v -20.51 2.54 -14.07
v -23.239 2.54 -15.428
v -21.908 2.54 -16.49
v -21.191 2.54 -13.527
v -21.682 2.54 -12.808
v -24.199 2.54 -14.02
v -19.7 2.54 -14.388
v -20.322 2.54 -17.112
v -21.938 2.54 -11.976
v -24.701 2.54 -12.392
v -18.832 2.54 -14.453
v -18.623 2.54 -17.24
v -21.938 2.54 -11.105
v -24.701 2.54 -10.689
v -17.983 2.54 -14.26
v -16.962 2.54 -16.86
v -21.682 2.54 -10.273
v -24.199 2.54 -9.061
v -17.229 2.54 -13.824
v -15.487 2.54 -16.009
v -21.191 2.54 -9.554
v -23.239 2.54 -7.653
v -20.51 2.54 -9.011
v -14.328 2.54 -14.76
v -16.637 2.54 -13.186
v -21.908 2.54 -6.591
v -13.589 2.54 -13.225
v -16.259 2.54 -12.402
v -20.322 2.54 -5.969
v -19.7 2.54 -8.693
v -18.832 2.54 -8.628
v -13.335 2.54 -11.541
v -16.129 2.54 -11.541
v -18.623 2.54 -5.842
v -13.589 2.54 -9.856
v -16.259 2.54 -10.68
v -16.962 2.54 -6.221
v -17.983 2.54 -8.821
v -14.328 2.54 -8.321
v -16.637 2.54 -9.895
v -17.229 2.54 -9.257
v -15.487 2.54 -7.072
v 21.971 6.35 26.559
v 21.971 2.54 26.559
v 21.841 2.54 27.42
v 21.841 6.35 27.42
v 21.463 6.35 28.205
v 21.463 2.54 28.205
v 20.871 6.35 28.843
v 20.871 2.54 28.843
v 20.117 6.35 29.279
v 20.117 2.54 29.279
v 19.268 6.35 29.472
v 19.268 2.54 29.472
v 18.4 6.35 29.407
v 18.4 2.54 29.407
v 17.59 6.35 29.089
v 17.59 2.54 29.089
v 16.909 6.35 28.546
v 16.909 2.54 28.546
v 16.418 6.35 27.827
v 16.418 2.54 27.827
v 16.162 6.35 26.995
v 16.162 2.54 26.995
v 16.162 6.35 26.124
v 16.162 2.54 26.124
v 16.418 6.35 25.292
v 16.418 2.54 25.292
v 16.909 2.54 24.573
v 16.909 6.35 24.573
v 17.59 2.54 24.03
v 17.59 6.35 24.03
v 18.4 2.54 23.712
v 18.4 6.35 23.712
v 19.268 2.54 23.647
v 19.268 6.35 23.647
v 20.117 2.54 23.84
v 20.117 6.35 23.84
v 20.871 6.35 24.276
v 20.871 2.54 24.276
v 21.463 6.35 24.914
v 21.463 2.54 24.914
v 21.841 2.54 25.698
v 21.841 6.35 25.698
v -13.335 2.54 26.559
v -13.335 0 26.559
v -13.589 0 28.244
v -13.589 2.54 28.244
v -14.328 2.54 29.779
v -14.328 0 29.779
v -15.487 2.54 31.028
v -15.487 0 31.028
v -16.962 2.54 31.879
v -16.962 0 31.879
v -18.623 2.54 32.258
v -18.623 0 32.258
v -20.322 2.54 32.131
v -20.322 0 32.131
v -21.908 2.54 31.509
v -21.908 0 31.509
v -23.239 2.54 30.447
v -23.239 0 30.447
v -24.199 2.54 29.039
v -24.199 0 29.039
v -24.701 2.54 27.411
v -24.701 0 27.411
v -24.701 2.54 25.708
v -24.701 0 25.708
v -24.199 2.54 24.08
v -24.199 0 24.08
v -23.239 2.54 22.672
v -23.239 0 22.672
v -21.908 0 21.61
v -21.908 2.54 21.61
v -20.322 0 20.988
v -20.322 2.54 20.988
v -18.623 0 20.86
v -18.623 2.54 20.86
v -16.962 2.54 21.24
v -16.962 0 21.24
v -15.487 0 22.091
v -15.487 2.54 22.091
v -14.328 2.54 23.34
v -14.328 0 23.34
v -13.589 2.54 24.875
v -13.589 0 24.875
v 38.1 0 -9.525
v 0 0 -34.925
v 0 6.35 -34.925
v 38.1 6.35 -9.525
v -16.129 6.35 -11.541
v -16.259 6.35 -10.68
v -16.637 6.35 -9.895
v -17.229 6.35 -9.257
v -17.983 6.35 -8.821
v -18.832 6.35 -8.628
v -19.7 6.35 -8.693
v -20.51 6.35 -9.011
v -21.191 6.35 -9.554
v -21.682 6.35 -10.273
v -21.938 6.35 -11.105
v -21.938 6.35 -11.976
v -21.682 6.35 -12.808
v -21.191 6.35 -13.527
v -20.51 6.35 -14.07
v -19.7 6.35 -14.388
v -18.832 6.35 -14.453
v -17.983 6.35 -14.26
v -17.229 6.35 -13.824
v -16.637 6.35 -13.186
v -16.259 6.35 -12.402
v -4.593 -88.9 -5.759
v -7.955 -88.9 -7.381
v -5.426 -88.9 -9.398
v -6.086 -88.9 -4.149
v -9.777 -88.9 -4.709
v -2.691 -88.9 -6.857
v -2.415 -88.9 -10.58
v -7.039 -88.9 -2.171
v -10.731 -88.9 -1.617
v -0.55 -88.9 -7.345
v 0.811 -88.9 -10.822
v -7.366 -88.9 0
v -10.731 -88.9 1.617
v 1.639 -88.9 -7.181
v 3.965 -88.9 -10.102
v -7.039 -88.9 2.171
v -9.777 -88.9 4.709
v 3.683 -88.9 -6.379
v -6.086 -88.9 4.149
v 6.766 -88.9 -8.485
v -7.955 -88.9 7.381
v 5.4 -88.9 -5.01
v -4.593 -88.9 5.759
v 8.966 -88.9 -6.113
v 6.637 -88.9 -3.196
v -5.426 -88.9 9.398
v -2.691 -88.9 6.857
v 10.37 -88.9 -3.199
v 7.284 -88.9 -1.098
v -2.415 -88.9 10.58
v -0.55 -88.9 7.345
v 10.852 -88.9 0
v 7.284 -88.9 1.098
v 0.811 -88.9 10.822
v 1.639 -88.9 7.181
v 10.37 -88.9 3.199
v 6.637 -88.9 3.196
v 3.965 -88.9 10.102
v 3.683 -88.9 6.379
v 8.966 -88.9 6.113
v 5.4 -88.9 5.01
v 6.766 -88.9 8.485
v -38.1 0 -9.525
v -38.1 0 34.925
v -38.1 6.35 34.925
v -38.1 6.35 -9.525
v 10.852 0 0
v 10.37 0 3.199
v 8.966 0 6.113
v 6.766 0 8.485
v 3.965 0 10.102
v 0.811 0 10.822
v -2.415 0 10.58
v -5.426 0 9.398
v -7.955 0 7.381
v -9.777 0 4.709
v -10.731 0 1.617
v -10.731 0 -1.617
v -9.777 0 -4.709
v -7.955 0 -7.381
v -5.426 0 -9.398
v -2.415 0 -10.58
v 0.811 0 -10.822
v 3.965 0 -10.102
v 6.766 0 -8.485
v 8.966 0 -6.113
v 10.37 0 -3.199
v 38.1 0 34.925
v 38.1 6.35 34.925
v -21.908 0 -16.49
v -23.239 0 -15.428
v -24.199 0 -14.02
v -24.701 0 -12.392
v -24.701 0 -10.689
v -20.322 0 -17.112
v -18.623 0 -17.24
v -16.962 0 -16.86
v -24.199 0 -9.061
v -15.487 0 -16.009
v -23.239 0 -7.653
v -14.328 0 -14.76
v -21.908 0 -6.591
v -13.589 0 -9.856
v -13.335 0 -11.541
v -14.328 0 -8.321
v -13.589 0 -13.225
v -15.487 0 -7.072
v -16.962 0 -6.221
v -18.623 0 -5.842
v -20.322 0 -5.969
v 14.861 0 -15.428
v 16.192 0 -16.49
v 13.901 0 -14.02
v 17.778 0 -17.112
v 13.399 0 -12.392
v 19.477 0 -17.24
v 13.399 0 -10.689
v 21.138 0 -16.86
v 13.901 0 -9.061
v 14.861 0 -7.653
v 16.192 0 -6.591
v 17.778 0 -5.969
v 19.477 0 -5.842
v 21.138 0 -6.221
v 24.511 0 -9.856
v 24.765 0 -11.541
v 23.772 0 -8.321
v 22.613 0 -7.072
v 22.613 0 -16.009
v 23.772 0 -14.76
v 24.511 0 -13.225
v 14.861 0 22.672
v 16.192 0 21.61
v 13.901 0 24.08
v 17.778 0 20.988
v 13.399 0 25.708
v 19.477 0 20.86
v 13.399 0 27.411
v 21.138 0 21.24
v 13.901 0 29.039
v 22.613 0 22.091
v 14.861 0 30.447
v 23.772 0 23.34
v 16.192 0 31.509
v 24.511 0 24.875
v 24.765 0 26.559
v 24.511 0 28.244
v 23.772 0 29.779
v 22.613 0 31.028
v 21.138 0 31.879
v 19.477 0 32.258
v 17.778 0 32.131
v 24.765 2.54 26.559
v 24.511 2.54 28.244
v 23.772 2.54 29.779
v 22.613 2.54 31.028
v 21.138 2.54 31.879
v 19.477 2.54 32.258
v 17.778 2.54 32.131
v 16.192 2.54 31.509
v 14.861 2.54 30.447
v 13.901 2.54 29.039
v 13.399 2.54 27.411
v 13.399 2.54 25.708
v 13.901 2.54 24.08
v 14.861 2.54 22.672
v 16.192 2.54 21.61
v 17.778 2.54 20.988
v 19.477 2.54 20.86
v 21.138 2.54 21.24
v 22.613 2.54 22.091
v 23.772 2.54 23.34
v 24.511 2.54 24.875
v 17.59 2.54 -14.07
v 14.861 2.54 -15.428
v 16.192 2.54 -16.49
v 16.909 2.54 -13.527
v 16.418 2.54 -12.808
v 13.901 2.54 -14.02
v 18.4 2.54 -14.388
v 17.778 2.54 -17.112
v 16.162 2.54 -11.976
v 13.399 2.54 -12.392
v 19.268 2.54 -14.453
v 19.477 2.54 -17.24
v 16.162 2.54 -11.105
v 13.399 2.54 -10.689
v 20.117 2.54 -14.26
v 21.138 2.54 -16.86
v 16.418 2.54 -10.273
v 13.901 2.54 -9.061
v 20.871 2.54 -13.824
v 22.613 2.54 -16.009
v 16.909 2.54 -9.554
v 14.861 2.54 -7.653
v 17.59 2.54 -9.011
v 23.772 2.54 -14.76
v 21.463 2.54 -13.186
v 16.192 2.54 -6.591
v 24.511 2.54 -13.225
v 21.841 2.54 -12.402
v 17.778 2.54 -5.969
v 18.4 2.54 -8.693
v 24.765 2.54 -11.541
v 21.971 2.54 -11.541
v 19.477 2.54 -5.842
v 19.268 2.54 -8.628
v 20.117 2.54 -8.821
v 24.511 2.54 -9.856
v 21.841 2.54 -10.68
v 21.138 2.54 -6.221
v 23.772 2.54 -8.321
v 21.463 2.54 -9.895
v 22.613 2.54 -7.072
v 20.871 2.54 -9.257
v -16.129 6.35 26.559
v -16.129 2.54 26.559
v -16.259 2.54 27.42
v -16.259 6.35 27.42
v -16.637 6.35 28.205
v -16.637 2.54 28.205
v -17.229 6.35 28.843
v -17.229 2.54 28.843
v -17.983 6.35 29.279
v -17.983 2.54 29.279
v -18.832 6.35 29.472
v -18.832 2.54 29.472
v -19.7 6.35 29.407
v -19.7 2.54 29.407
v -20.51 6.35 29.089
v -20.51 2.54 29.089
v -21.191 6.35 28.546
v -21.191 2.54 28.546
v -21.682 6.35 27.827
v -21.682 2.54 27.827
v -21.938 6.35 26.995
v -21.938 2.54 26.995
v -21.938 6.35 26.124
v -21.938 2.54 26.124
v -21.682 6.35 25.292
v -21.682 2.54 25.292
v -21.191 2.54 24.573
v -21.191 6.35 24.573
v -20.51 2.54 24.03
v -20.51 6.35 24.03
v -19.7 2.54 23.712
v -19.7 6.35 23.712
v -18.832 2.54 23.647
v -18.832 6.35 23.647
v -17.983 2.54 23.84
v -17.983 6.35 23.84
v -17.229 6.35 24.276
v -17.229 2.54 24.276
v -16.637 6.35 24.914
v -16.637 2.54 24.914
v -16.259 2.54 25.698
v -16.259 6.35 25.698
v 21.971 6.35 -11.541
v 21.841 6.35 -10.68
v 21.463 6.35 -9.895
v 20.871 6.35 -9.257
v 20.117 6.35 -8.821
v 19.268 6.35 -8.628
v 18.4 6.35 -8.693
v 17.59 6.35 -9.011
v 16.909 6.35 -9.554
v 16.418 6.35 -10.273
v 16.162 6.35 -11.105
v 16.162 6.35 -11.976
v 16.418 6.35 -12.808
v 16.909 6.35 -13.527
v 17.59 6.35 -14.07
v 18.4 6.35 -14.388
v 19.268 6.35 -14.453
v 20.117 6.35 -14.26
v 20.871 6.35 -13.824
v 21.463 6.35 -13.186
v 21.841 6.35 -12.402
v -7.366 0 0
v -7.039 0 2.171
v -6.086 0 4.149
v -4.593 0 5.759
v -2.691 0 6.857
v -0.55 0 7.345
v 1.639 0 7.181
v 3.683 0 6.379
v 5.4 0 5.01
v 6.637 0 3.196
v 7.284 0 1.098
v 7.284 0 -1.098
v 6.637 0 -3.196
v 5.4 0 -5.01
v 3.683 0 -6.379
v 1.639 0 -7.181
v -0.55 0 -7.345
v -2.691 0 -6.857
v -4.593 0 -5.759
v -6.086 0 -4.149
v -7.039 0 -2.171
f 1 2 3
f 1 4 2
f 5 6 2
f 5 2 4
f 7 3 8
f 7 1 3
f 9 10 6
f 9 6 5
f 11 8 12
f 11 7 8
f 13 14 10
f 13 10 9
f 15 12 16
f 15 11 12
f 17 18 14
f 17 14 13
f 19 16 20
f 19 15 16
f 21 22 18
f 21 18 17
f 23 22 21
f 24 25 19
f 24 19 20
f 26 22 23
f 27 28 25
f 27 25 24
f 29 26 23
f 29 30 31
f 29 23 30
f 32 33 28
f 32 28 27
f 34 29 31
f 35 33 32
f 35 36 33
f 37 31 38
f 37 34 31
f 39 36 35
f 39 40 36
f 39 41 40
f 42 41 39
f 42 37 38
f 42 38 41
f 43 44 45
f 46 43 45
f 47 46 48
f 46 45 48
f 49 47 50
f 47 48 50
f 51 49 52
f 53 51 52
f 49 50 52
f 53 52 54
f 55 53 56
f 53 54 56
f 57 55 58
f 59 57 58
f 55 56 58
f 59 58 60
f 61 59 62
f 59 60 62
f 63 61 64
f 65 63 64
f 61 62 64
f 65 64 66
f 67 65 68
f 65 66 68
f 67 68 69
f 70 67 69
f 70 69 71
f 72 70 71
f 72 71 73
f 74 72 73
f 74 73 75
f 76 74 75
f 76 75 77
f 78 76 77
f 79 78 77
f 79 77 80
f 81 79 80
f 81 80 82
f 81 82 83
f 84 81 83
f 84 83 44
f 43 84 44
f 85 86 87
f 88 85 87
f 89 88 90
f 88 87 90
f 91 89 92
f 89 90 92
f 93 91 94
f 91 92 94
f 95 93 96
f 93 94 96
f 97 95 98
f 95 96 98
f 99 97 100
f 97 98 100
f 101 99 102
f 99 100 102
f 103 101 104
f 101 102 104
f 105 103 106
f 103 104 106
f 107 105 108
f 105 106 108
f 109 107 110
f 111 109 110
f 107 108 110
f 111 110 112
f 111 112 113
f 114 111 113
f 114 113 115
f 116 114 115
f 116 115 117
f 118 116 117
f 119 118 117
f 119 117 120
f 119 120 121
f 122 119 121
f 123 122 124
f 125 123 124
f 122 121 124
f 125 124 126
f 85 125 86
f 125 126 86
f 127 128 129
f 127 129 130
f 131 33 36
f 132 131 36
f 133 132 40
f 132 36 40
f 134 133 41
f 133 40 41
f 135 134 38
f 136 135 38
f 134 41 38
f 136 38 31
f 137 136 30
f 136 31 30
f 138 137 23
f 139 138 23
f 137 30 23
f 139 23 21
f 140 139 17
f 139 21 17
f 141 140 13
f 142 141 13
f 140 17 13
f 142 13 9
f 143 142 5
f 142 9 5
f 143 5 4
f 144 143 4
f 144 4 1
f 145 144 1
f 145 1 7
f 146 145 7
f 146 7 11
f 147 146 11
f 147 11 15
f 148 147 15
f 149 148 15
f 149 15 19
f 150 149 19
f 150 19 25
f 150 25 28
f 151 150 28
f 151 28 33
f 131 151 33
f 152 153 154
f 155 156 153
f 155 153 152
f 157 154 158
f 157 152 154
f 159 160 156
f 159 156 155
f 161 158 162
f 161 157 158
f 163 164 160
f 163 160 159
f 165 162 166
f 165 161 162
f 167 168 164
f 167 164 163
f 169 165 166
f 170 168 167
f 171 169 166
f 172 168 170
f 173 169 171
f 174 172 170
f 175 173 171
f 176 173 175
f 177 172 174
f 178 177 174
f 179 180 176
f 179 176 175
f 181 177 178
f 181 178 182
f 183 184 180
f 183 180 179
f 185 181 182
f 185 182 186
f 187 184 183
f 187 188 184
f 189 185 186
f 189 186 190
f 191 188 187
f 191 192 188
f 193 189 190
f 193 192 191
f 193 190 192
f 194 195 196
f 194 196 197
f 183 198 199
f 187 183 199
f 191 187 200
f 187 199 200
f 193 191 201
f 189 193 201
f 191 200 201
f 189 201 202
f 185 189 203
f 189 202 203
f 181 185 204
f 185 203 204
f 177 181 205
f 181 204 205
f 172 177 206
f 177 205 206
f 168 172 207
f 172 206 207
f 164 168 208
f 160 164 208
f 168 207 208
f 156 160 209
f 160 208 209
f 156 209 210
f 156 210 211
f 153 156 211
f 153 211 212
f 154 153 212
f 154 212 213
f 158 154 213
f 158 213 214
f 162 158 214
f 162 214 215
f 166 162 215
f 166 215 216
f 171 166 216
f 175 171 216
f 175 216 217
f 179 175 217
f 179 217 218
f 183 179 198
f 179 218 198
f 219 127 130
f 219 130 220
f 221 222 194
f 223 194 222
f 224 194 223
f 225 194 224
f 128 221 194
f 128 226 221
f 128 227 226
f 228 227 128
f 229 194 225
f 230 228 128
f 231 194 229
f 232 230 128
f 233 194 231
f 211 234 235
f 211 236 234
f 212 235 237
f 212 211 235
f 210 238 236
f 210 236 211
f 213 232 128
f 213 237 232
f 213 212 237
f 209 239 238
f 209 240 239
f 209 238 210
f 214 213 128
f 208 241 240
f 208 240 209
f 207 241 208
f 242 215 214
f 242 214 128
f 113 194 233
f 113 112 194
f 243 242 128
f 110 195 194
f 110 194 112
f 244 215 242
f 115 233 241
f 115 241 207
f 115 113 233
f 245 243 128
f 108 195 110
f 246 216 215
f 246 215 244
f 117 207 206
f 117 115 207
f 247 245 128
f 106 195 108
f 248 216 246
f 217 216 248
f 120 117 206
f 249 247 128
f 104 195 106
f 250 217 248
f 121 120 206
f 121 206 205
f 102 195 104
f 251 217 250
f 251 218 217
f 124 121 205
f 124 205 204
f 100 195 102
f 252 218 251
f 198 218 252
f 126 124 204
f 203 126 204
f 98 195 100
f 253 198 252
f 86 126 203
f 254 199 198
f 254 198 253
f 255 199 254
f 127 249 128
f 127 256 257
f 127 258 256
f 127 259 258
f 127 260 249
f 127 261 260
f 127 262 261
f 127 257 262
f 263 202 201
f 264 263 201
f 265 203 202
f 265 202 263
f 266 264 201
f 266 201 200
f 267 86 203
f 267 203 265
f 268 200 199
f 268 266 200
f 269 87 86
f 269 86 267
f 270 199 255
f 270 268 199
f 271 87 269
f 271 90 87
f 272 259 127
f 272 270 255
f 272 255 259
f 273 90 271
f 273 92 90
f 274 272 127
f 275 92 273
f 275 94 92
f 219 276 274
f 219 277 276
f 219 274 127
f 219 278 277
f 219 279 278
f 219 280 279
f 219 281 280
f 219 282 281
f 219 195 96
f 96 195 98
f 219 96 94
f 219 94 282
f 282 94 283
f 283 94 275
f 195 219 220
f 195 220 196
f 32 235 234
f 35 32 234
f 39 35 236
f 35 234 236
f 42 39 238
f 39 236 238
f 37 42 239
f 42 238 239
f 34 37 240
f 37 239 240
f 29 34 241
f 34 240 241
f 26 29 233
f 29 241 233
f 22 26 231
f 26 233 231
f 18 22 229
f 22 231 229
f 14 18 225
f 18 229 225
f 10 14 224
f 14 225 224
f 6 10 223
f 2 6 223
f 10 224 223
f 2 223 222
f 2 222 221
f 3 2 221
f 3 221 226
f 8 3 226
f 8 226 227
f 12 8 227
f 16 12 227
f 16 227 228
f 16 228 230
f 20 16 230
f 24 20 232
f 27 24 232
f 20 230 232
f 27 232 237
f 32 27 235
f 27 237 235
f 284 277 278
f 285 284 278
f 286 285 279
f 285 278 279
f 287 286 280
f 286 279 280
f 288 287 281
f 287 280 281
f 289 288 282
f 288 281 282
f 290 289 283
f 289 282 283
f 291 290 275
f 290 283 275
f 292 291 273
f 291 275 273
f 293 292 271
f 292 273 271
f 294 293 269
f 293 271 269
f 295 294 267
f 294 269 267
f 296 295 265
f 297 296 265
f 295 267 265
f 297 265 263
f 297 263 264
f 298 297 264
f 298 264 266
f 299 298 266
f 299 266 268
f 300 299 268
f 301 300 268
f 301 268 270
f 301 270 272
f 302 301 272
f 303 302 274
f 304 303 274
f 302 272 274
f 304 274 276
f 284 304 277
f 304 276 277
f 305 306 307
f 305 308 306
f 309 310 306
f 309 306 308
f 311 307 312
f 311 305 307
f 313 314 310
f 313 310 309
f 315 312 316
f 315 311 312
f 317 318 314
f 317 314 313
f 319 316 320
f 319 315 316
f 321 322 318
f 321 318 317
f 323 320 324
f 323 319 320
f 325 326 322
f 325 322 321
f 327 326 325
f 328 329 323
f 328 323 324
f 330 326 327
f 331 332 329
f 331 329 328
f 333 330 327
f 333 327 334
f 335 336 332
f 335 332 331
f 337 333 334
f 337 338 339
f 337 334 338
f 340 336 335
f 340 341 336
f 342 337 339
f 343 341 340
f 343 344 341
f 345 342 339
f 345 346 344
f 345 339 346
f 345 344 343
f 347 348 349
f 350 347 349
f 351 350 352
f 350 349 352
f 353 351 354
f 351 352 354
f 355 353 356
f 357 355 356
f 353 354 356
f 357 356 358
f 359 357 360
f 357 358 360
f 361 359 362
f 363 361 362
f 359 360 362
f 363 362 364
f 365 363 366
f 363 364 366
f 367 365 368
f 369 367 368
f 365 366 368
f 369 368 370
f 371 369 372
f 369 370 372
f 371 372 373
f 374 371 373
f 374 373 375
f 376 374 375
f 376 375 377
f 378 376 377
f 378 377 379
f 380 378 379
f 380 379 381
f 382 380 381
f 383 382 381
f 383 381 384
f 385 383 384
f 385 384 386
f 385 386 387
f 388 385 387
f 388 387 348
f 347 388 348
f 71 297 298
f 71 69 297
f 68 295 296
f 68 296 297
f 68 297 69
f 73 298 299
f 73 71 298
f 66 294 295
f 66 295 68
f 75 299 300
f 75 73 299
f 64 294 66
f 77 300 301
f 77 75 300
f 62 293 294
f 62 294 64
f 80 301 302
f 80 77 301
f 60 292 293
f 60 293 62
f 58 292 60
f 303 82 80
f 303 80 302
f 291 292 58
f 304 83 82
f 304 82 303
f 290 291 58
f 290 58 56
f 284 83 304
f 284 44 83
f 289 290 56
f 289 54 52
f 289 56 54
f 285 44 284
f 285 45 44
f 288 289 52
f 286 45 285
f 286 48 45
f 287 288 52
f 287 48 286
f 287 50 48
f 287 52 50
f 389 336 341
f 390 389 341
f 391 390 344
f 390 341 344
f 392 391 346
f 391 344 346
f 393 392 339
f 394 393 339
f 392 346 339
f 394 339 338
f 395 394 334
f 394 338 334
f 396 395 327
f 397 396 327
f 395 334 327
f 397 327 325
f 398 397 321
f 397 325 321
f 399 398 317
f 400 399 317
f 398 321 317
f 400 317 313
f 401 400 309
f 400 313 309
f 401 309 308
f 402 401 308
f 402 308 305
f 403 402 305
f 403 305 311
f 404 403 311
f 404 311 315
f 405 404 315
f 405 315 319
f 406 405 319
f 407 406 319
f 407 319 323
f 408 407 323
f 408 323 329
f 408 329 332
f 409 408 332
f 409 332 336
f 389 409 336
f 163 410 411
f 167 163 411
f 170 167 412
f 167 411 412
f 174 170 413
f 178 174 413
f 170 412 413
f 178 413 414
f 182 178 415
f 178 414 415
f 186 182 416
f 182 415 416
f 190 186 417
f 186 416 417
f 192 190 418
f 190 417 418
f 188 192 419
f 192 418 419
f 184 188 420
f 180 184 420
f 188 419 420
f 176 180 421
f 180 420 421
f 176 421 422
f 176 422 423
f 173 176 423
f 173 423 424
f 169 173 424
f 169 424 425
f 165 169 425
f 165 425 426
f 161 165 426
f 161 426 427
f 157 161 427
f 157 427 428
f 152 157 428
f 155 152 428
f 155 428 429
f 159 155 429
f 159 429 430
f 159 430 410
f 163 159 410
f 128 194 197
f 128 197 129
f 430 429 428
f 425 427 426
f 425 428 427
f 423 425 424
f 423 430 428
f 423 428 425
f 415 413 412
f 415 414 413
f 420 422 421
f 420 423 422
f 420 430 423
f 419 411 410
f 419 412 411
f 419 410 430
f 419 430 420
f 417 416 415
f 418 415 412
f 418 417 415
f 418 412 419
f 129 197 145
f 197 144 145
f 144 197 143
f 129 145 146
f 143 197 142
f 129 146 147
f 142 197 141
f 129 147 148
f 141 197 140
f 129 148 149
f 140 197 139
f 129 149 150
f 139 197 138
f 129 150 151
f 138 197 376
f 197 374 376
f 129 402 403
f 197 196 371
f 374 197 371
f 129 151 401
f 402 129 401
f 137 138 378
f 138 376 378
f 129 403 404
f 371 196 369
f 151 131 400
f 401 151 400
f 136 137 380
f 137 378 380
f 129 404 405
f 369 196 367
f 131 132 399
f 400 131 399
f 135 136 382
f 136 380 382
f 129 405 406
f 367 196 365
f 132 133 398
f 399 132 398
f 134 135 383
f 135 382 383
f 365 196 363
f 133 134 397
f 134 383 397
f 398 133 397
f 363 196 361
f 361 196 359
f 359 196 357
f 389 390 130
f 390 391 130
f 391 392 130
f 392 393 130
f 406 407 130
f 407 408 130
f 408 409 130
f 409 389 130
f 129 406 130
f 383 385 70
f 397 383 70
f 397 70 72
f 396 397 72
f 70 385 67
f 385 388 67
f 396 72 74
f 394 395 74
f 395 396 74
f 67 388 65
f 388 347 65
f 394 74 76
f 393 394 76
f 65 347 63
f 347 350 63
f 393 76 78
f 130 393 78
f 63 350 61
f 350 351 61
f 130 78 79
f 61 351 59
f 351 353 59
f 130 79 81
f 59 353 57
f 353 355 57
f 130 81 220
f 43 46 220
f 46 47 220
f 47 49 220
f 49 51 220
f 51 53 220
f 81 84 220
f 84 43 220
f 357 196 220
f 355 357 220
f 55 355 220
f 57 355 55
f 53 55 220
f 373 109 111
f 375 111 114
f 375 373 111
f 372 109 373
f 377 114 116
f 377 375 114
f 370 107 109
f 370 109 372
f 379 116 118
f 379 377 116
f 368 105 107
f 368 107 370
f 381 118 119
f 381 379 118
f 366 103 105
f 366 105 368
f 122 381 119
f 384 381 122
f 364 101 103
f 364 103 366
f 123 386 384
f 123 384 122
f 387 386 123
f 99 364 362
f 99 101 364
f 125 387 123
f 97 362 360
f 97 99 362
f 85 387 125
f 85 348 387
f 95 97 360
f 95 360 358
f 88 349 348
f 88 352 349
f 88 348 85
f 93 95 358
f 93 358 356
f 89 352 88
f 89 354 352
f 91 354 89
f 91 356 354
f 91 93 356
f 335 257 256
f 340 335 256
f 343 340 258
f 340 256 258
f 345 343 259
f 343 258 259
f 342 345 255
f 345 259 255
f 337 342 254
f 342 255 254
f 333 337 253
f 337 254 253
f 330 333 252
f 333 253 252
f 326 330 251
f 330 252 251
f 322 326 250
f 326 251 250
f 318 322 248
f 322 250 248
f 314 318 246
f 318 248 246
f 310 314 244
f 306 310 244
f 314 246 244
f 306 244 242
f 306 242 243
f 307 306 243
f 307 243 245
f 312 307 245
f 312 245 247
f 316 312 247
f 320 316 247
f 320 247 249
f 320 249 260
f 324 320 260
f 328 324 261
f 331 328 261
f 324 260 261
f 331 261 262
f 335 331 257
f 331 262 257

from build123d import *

# Parameters (mm, degrees)
F0_R     = 10.85215
F1_DEPTH = 88.9
F3_D     = 14.732
F5_DEPTH = 6.35
F7_D     = 5.842
F8_R     = 5.715
F9_DEPTH = 2.54


with BuildPart() as f1:
    # F0 (on Front) → F1 (new body)
    with BuildSketch(Plane.XZ):
        Circle(F0_R)
    extrude(amount=F1_DEPTH)

    # F3 (through all)
    with Locations(Plane.XZ.offset(88.9)):
        with Locations((0, 0)):
            Hole(F3_D / 2)

    # F4 (on Front) → F5 (join)
    with BuildSketch(Plane.XZ):
        Polygon((0, 0), (0, 34.925), (-38.1, 34.925), (-38.1, -9.525), (0, -34.925), align=None)
        Polygon((38.1, 34.925), (0, 34.925), (0, 0), (0, -34.925), (38.1, -9.525), align=None)
    extrude(amount=-F5_DEPTH)

    # F7 (through all)
    with Locations(Plane(origin=(0, 6.35, 0), x_dir=(-1, 0, 0), z_dir=(0, 1, 0))):
        with Locations((-19.05, 26.55945), (19.05, 26.55945), (19.05, -11.54055), (-19.05, -11.54055)):
            Hole(F7_D / 2)

    # F8 (on face) → F9 (cut)
    with BuildSketch(Plane.XZ):
        with Locations((-19.05, 26.55945)):
            Circle(F8_R)
        with Locations((19.05, 26.55945)):
            Circle(F8_R)
        with Locations((-19.05, -11.54055)):
            Circle(F8_R)
        with Locations((19.05, -11.54055)):
            Circle(F8_R)
    extrude(amount=-F9_DEPTH, mode=Mode.SUBTRACT)


solid = f1.part
